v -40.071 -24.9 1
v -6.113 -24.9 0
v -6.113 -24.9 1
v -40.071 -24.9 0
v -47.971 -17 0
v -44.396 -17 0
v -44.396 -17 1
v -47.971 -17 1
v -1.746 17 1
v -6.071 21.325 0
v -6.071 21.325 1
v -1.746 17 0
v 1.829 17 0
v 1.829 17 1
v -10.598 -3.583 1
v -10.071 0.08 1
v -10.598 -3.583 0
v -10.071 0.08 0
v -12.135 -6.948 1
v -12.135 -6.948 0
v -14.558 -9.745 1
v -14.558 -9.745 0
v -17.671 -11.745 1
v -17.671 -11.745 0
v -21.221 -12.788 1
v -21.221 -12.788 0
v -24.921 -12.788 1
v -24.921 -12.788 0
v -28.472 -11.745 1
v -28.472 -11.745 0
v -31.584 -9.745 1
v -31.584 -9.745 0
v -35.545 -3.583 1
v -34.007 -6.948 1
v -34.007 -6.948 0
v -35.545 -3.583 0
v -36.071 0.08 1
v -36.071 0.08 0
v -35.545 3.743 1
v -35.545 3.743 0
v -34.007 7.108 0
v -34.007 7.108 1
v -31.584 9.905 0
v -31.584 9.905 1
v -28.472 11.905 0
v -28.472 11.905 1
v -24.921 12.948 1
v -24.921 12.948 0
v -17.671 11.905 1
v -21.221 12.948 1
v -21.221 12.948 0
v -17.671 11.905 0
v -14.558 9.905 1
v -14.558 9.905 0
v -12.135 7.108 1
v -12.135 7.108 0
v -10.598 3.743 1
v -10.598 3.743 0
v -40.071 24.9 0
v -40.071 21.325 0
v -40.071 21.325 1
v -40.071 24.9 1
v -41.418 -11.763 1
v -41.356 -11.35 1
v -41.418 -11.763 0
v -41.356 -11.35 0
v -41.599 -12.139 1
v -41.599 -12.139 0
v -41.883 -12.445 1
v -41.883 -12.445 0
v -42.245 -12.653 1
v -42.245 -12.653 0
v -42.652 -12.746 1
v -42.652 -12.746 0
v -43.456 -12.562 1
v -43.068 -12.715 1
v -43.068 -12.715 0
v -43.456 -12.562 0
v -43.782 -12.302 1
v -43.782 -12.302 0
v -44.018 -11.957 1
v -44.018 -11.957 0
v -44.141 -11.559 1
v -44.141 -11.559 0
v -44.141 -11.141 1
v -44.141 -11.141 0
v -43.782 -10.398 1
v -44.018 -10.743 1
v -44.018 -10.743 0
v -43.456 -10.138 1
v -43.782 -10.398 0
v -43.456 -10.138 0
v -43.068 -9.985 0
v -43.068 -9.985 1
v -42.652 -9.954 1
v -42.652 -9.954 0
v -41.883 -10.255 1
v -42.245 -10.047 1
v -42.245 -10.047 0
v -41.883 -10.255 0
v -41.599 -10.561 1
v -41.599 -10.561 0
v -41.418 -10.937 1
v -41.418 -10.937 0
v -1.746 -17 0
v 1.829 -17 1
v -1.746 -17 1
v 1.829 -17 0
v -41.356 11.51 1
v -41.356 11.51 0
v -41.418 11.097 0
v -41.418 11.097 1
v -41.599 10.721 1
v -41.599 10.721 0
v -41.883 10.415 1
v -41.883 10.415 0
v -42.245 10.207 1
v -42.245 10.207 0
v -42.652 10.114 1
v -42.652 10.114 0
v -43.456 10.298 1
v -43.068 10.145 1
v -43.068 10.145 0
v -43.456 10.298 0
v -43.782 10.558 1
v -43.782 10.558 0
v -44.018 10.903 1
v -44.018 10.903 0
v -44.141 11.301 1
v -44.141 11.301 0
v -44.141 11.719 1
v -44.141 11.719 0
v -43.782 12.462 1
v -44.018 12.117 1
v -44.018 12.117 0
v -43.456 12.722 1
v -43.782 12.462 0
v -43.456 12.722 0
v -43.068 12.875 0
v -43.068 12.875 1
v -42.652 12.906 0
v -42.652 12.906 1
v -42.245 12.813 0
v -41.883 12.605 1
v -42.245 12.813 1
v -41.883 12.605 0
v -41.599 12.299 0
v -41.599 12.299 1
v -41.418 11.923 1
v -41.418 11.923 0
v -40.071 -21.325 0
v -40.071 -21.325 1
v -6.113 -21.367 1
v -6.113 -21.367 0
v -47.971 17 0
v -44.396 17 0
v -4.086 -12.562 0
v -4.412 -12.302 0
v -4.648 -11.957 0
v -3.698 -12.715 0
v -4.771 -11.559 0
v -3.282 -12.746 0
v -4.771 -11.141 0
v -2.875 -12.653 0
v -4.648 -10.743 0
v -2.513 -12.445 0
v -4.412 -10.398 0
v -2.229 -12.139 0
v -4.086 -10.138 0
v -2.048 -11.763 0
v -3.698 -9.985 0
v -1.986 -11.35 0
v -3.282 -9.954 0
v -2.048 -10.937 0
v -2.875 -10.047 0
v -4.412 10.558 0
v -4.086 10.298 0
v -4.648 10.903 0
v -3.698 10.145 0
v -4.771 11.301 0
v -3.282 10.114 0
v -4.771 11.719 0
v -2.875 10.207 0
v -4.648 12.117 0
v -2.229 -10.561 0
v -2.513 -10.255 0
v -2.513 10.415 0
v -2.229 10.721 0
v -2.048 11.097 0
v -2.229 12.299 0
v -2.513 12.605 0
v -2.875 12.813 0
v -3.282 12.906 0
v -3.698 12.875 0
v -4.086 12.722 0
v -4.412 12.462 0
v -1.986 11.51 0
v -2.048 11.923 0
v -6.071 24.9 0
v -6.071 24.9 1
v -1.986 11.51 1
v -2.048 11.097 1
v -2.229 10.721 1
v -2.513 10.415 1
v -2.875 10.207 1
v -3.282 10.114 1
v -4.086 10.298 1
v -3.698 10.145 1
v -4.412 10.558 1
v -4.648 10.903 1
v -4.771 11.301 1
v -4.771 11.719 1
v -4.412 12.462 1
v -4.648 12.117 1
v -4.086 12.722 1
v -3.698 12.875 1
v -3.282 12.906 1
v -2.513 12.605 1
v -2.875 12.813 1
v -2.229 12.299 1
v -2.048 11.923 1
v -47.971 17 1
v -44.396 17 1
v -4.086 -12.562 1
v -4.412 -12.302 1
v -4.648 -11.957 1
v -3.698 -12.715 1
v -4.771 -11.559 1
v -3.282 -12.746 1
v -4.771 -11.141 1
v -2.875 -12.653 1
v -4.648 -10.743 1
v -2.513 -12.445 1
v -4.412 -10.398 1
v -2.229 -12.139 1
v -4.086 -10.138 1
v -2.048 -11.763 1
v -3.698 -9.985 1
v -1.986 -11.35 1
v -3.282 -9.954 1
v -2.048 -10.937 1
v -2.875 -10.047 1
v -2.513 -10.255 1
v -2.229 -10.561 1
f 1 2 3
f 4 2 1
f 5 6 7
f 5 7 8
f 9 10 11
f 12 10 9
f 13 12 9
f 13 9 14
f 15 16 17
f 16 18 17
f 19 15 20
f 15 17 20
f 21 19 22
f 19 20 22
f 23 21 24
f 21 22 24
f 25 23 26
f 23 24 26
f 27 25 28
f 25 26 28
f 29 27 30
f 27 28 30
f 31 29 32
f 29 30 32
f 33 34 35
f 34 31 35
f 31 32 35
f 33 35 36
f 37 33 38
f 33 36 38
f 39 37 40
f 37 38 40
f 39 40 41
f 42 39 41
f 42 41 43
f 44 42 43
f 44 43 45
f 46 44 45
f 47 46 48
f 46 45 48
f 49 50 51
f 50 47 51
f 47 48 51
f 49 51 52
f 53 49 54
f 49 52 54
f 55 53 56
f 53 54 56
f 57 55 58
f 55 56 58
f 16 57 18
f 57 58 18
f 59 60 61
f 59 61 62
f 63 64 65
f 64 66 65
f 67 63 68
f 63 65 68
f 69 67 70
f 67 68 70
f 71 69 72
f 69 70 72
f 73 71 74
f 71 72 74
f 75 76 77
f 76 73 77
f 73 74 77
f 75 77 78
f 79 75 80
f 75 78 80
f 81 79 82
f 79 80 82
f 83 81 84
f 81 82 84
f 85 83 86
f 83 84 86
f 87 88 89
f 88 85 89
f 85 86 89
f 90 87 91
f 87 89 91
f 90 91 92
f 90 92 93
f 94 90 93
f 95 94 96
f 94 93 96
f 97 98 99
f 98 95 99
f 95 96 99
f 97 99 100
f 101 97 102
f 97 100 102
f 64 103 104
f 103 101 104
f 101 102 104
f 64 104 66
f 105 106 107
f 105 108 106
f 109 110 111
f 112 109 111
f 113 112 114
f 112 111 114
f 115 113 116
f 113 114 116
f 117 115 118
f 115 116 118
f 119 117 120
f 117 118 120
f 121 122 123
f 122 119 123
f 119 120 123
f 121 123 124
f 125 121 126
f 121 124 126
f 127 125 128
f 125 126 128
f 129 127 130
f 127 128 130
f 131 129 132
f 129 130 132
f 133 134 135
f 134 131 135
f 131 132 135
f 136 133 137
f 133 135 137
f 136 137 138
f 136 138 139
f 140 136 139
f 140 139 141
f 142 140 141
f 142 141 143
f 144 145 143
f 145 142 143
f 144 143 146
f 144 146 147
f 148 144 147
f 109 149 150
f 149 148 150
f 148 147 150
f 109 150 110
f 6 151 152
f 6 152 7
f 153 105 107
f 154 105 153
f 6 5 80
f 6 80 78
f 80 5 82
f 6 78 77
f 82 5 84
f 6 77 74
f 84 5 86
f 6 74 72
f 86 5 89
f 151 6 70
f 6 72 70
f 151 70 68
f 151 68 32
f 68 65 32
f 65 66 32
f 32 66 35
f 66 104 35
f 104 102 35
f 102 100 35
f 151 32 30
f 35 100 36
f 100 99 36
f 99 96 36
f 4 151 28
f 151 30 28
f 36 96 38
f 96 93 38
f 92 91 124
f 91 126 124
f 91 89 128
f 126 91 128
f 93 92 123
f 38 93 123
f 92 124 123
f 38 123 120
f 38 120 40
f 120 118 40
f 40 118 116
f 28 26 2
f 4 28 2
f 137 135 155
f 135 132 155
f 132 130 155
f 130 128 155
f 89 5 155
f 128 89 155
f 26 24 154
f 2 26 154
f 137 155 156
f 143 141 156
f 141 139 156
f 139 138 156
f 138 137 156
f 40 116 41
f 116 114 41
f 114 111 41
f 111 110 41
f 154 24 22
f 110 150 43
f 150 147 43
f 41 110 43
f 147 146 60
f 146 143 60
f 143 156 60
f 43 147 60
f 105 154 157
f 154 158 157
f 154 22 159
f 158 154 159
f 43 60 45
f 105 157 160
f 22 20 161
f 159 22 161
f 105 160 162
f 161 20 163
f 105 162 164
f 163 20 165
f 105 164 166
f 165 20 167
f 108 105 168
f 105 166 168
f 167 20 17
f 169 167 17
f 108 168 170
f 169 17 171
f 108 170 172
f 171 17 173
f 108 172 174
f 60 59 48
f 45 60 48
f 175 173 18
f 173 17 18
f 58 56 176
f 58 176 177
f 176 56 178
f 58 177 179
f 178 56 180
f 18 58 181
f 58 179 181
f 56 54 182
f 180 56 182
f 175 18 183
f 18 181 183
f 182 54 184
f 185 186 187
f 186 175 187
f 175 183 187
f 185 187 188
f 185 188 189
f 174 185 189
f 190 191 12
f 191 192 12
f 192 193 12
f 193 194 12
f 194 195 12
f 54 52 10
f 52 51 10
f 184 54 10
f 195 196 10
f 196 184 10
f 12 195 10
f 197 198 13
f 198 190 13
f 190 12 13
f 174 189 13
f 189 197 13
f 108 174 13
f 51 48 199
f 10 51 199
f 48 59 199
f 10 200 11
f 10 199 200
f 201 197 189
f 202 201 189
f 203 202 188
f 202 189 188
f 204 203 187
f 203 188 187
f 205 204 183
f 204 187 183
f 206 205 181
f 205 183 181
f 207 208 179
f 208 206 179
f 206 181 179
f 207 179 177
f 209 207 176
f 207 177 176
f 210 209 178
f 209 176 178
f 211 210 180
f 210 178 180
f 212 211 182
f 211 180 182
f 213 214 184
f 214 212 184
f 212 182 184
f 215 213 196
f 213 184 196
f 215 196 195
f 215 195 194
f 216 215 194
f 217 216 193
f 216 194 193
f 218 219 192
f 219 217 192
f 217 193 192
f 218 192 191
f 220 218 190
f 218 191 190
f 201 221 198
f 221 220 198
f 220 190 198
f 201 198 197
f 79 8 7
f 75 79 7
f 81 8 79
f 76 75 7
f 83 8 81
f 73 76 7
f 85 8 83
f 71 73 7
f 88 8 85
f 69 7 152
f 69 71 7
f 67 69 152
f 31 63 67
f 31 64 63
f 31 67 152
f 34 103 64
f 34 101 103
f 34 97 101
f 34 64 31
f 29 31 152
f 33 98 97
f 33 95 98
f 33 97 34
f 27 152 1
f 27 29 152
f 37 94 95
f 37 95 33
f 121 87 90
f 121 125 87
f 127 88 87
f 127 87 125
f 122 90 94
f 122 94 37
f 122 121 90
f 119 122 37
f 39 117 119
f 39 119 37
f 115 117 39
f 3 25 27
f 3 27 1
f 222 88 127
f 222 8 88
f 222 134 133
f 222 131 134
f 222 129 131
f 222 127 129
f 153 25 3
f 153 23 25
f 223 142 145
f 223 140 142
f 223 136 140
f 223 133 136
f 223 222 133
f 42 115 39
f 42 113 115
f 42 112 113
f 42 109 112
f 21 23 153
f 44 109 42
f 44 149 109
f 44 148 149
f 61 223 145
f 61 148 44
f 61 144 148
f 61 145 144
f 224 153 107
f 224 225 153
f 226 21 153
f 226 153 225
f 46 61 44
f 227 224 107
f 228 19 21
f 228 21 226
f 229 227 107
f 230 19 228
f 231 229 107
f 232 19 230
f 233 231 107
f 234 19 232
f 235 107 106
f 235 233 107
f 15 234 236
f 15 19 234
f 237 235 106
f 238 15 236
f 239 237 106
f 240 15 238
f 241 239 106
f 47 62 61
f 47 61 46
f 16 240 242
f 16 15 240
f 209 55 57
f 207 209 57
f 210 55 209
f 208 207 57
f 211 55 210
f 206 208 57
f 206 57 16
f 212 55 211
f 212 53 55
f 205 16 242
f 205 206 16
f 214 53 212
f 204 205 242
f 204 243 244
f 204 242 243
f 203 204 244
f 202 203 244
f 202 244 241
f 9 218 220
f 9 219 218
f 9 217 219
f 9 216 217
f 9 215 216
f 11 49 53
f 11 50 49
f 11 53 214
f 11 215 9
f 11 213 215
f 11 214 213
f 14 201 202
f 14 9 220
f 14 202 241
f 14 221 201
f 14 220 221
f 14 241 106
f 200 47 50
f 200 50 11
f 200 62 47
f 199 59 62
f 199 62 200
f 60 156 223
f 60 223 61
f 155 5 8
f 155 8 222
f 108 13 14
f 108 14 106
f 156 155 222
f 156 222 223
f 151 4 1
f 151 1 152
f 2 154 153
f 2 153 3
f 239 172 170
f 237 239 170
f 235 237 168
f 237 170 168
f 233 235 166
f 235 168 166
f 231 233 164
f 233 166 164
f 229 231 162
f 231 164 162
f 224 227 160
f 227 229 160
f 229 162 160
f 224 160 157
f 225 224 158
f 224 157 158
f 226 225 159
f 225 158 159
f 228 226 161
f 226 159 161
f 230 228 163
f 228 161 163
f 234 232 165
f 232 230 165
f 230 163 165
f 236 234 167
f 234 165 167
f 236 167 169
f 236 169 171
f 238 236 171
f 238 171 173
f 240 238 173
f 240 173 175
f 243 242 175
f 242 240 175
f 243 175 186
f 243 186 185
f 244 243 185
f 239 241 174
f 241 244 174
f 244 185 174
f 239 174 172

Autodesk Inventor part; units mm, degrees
ref_plane "YZ Plane" through (0, 0, 0) normal (1, 0, 0) x (0, 1, 0)
ref_plane "XZ Plane" through (0, 0, 0) normal (0, 1, 0) x (-1, 0, 0)
ref_plane "XY Plane" through (0, 0, 0) normal (0, 0, 1) x (1, 0, 0)
ref_plane "Arbeitsebene1" through (0, 0, 0) normal (0, 0, 1) x (1, 0, 0)
sketch "Skizze1" plane through (0, 0, 0) normal (0, 0, 1) x (1, 0, 0)
  circle A0 centre (-3.3862, 11.51) radius 1.4 projected
  circle A1 centre (-42.7562, -11.35) radius 1.4 projected
  circle A2 centre (-42.7562, 11.51) radius 1.4 projected
  circle A3 centre (-3.3862, -11.35) radius 1.4 projected
  circle A4 centre (-23.0712, 0.08) radius 13 projected
  line L0 (-6.1126, -24.9) -> (-40.0712, -24.9) projected
  line L1 (-40.0712, -24.9) -> (-40.0712, -21.3252) projected
  line L2 (-40.0712, -21.3252) -> (-44.3964, -17) projected
  line L3 (-44.3964, -17) -> (-47.9712, -17) projected
  line L4 (-47.9712, -17) -> (-47.9712, 17) projected
  line L5 (-47.9712, 17) -> (-44.3964, 17) projected
  line L6 (-44.3964, 17) -> (-40.0712, 21.3252) projected
  line L7 (-40.0712, 21.3252) -> (-40.0712, 24.9) projected
  line L8 (-40.0712, 24.9) -> (-6.0712, 24.9) projected
  line L9 (-6.0712, 24.9) -> (-6.0712, 21.3252) projected
  line L10 (-6.0712, 21.3252) -> (-1.746, 17) projected
  line L11 (-1.746, 17) -> (1.8288, 17) projected
  line L12 (1.8288, 17) -> (1.8288, -17) projected
  line L13 (1.8288, -17) -> (-1.746, -17) projected
  line L14 (-1.746, -17) -> (-6.1126, -21.3666) projected
  line L15 (-6.1126, -21.3666) -> (-6.1126, -24.9) projected
  point P0 (0, 0)
extrude "Extrusion1" add sketch "Skizze1" along normal blind 1
properties part number "20_Cube_Insert_XY_manipulator_lid_v3"
